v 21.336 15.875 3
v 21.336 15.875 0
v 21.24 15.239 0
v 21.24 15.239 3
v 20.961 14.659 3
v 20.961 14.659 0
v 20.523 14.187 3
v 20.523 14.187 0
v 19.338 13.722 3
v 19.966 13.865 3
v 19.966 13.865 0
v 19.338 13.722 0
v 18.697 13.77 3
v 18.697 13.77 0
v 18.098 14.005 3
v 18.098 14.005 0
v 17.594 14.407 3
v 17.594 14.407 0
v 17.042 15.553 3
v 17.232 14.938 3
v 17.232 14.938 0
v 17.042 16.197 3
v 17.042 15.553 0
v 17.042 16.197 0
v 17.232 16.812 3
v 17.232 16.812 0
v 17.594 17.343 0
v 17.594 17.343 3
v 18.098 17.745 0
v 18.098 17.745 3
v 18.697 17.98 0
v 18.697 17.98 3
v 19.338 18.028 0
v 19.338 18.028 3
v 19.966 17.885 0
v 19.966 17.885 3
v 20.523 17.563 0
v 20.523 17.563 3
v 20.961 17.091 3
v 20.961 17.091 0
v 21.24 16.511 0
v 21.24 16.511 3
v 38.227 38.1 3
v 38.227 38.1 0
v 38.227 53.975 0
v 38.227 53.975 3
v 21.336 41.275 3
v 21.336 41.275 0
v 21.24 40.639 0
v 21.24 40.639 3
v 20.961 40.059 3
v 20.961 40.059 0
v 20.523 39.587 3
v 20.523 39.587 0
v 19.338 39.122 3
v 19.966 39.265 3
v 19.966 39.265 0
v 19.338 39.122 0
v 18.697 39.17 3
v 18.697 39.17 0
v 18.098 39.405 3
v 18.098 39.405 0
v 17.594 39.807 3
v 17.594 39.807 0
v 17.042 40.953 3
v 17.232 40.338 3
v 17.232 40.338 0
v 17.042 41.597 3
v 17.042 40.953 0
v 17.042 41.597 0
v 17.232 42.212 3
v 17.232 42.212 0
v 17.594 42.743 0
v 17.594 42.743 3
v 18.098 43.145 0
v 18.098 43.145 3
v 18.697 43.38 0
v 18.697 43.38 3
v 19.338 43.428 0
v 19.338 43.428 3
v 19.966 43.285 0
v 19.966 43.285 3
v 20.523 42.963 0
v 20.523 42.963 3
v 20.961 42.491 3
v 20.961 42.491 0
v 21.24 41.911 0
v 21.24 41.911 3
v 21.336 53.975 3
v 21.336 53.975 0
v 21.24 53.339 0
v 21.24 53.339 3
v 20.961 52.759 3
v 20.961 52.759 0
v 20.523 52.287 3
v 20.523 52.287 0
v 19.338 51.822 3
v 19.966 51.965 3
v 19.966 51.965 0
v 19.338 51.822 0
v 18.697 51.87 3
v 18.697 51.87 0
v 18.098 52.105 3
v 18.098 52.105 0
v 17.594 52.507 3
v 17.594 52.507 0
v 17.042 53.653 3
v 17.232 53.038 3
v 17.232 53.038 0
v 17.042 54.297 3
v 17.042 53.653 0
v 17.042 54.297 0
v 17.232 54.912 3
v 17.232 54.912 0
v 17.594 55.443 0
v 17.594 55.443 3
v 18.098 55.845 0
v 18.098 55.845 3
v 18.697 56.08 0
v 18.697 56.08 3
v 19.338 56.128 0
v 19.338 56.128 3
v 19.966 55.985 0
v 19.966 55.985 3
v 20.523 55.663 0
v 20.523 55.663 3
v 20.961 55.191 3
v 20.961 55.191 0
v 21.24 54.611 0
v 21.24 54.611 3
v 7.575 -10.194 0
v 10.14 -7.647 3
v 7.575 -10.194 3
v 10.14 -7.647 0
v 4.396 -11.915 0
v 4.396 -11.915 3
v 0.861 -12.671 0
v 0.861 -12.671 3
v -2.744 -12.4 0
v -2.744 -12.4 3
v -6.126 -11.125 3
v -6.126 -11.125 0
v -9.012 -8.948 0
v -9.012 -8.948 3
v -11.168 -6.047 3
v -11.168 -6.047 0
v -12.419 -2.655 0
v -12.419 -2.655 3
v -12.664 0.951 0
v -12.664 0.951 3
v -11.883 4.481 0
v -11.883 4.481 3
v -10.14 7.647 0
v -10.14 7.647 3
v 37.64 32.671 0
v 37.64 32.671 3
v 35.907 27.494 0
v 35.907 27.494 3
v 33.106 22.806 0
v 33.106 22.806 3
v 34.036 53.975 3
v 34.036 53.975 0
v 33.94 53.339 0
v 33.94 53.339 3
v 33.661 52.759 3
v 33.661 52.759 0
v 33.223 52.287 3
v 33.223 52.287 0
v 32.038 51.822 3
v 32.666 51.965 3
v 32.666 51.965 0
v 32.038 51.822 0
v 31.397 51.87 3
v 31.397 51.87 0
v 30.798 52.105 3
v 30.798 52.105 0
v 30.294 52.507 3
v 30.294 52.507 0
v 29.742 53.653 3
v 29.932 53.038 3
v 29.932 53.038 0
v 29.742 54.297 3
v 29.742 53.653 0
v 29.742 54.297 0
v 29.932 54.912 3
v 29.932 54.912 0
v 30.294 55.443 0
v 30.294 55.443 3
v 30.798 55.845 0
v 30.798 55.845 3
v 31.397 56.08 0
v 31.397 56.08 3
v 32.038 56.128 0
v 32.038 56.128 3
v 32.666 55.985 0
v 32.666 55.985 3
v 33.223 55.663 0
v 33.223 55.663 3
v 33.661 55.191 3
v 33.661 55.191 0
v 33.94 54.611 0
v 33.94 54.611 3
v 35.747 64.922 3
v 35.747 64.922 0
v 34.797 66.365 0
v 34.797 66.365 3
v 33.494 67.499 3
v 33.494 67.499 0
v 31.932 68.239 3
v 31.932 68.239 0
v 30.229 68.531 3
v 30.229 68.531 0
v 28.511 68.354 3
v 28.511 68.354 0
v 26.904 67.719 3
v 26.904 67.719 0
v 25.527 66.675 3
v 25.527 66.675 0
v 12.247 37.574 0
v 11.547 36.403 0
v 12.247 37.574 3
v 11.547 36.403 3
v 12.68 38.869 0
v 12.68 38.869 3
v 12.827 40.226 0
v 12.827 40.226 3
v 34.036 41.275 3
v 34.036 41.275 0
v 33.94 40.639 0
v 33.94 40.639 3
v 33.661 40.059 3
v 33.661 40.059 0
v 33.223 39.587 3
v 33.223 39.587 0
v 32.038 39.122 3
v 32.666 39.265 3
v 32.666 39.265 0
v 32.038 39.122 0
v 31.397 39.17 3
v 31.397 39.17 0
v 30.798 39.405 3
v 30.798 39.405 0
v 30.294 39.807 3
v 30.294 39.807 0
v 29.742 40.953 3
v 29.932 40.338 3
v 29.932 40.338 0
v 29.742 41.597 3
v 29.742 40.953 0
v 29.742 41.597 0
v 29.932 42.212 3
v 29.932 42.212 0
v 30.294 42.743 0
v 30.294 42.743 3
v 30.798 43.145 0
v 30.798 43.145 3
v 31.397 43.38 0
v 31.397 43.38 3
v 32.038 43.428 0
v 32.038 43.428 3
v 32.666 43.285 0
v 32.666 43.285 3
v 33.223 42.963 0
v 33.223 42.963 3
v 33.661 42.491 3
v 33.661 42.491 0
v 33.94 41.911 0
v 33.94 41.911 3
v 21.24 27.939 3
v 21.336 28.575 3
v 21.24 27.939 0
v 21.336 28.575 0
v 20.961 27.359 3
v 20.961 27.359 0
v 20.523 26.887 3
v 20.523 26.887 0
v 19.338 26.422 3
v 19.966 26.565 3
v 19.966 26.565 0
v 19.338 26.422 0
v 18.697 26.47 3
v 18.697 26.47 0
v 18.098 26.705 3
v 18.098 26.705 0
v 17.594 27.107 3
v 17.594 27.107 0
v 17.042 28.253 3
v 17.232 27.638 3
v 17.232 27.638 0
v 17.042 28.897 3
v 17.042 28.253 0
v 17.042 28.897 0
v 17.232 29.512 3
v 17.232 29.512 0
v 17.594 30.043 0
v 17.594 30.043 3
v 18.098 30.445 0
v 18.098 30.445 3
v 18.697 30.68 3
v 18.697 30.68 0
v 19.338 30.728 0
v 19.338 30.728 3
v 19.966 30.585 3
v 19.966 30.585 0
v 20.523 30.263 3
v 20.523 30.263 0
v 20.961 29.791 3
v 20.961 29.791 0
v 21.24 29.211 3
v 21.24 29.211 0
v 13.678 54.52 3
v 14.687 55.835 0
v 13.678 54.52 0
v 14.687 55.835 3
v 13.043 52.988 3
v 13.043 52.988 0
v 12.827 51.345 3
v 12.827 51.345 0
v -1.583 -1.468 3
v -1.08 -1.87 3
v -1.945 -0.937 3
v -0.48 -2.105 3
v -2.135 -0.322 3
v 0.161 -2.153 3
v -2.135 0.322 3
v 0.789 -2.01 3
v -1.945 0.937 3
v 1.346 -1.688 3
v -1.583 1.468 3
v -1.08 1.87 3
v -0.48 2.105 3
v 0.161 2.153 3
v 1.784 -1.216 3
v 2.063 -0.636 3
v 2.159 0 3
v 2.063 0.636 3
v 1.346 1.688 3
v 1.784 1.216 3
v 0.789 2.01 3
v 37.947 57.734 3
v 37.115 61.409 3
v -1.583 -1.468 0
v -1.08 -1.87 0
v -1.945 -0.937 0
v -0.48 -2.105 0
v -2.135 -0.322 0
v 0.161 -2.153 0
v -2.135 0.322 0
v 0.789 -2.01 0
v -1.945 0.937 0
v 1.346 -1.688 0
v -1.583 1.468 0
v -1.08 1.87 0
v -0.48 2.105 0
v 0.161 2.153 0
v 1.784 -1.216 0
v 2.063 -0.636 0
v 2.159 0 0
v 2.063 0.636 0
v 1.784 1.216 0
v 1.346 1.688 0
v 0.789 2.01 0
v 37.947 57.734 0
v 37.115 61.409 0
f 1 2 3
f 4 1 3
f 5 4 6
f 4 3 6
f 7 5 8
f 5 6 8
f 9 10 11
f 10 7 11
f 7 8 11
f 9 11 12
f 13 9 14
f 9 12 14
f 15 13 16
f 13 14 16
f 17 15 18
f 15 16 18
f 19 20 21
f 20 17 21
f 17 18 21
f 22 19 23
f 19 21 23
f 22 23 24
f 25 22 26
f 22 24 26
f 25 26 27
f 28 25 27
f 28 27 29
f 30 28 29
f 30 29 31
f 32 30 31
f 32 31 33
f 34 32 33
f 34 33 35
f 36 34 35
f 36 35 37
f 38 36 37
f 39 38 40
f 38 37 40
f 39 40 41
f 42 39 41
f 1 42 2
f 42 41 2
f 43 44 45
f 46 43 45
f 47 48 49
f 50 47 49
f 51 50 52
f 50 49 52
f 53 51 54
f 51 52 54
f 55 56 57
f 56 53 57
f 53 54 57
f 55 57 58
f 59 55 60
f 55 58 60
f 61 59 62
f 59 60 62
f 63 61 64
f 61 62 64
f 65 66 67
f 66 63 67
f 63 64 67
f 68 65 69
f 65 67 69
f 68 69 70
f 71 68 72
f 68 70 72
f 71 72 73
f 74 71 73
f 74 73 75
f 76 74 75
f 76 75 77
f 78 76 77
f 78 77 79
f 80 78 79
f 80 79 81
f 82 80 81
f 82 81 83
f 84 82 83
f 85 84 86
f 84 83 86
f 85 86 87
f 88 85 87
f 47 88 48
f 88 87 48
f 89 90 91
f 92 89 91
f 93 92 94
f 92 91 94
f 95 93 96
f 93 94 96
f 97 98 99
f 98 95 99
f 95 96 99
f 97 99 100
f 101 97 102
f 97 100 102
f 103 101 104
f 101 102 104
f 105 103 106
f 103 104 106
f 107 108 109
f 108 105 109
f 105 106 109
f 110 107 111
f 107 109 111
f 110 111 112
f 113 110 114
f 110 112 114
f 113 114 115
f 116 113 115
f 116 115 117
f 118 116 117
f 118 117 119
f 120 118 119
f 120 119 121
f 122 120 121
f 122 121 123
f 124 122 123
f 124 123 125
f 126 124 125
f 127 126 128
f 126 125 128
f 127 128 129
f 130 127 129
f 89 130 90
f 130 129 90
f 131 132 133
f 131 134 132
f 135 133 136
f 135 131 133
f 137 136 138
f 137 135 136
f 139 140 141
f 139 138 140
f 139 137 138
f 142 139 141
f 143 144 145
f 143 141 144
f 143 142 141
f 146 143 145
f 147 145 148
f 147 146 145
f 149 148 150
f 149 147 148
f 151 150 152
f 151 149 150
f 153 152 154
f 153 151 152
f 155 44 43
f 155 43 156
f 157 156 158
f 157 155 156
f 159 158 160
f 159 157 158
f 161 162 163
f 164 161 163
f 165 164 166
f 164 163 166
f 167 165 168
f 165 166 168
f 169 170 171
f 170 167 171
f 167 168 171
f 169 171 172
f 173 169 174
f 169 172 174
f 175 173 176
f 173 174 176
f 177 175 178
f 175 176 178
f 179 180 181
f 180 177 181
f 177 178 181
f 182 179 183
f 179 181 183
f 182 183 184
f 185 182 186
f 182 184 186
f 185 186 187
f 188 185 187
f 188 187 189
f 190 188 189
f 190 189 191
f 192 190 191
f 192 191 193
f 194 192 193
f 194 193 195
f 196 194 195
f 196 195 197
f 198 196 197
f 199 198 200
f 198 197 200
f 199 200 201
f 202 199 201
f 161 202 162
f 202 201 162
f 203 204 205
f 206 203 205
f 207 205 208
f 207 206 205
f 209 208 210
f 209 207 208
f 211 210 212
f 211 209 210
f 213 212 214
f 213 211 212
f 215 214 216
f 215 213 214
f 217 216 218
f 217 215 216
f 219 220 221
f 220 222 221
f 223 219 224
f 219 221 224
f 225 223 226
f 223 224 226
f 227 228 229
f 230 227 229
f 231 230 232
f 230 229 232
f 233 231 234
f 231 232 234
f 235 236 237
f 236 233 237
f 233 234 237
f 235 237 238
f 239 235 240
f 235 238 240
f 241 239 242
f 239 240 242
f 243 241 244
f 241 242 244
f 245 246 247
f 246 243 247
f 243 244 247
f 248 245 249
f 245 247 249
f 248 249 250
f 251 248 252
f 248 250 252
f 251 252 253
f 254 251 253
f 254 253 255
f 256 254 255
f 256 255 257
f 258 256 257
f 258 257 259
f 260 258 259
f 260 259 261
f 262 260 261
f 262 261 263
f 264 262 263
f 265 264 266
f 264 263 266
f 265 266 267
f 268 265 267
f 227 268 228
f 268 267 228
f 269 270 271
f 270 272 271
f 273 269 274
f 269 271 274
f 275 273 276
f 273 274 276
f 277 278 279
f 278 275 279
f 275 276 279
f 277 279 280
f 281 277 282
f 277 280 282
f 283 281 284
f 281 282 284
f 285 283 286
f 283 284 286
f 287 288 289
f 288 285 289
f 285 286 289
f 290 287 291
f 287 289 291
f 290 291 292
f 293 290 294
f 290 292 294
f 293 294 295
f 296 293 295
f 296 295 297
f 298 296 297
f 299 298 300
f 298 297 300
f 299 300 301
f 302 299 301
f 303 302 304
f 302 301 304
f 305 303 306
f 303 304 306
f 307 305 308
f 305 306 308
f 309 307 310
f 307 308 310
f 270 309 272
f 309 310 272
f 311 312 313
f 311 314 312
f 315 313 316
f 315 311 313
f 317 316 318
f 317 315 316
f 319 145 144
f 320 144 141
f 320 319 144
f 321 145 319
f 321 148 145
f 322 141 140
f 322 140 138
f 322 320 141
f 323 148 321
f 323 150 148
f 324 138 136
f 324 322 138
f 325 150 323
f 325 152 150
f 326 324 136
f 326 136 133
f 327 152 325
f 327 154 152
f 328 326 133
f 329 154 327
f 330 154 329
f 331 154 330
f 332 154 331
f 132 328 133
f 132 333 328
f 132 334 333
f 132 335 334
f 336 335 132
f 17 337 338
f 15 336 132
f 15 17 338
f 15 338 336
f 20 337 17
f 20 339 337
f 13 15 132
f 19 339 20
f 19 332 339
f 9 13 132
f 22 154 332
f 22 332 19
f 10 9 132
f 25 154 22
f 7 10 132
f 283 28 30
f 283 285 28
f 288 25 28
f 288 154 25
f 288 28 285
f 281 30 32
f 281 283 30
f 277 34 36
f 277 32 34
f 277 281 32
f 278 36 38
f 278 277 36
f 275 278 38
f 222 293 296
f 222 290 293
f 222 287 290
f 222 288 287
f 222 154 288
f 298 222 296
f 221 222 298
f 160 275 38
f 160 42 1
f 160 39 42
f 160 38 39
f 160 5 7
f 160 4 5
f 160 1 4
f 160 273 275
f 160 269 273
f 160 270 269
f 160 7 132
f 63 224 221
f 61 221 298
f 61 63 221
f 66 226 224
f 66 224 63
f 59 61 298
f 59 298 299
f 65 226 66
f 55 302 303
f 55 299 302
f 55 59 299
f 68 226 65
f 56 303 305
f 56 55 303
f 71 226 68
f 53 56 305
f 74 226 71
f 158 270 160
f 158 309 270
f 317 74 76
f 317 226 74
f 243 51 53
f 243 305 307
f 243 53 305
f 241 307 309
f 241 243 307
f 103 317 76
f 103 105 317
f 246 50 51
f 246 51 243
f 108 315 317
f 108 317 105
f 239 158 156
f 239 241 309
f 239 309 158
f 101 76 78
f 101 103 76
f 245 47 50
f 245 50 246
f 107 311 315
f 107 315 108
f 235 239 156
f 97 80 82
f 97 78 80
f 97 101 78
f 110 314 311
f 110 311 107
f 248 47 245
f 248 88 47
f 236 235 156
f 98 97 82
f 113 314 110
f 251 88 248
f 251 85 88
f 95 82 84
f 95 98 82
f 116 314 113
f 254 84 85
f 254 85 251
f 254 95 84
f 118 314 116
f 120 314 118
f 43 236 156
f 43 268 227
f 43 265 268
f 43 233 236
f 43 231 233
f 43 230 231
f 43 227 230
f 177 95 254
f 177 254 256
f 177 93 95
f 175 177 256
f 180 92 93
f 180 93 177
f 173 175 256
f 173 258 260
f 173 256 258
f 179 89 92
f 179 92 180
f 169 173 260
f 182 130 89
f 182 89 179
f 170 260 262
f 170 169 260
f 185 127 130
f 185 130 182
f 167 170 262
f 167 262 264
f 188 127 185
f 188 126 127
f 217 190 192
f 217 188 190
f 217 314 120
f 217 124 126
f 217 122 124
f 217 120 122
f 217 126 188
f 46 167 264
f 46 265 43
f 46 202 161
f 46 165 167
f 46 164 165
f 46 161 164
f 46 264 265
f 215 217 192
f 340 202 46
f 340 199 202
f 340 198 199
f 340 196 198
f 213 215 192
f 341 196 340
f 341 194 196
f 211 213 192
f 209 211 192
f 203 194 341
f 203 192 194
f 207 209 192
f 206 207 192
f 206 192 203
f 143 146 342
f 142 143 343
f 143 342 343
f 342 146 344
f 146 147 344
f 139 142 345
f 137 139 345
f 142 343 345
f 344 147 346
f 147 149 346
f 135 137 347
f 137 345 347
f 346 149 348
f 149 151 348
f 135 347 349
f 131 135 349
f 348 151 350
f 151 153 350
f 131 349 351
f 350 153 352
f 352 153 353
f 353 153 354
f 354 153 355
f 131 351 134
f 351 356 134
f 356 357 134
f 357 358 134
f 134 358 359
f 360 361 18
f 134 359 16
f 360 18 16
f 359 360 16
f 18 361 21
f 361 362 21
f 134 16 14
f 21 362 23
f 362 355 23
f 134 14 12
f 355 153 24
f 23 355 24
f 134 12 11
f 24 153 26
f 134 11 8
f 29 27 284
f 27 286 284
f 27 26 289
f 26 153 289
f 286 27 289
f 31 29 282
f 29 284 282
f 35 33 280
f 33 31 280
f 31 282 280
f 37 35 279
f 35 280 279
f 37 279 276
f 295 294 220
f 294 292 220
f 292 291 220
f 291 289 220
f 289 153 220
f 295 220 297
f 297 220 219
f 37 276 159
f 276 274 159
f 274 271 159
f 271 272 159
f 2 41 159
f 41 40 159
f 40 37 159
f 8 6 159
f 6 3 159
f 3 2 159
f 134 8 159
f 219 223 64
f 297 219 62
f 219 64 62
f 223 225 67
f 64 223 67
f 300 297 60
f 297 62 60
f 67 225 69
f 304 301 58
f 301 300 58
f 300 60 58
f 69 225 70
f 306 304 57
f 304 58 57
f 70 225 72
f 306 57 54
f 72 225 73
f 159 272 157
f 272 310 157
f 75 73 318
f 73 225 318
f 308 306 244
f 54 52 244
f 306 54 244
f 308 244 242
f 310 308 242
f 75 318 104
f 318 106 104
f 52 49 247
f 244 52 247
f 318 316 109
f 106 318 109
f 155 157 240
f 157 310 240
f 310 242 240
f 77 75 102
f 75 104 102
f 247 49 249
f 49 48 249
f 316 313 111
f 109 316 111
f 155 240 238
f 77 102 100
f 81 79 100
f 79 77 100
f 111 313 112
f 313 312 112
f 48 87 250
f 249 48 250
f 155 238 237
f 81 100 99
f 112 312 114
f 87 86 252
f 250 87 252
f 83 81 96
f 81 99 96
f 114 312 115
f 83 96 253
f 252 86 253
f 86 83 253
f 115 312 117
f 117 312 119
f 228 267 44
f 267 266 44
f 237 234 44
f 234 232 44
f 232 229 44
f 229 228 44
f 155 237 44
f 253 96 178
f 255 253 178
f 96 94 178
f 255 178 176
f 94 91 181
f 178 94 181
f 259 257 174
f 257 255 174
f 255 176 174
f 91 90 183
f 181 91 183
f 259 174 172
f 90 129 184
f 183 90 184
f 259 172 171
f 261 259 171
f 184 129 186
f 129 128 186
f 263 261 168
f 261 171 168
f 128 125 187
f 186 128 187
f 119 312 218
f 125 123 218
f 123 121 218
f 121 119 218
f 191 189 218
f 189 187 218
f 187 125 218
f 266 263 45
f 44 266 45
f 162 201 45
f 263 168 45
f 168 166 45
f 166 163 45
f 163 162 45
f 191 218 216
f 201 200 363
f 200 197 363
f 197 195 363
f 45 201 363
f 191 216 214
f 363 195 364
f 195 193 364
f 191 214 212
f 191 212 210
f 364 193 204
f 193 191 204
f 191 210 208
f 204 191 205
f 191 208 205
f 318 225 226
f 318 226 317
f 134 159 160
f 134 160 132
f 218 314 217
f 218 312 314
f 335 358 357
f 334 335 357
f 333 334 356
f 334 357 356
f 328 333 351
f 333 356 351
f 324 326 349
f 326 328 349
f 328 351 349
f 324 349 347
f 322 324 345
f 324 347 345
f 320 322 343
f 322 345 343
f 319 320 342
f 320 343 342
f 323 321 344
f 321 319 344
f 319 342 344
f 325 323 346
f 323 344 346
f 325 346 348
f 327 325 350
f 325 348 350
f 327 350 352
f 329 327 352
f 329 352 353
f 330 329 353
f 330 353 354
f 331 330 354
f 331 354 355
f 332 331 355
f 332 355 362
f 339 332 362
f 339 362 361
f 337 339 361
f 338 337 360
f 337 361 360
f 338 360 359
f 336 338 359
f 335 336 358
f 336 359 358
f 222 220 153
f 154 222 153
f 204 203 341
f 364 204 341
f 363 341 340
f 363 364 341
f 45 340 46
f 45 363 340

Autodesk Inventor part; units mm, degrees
ref_plane "YZ Plane" through (0, 0, 0) normal (1, 0, 0) x (0, 1, 0)
ref_plane "XZ Plane" through (0, 0, 0) normal (0, 1, 0) x (-1, 0, 0)
ref_plane "XY Plane" through (0, 0, 0) normal (0, 0, 1) x (1, 0, 0)
sketch "Sketch1" plane through (0, 0, 0) normal (0, 0, 1) x (1, 0, 0)
  circle A0 centre (0, 0) radius 2.159
  circle A1 centre (0, 0) radius 12.7
  line L0 (0, 0) -> (0, 38.1) construction
  line L1 (0, 38.1) -> (12.827, 38.1) construction
  line L2 (12.827, 38.1) -> (12.827, 53.975)
  line L3 (12.827, 53.975) -> (30.7875, 71.9355)
  line L4 (12.827, 53.975) -> (38.227, 53.975) construction
  arc A2 (38.227, 53.975) -> (30.7875, 71.9355) centre (12.827, 53.975) ccw
  line L5 (12.827, 38.1) -> (-10.1397, 7.647)
  arc A3 (33.1064, 22.806) -> (38.227, 38.1) centre (12.827, 38.1) ccw
  line L6 (33.1064, 22.806) -> (10.1397, -7.647)
  line L7 (38.227, 38.1) -> (38.227, 53.975)
  circle A4 centre (31.877, 53.975) radius 2.159
  circle A5 centre (19.177, 53.975) radius 2.159
  circle A6 centre (31.877, 41.275) radius 2.159
  circle A7 centre (19.177, 41.275) radius 2.159
  circle A8 centre (31.877, 53.975) radius 6.35 construction
  circle A9 centre (19.177, 53.975) radius 6.35 construction
  circle A10 centre (19.177, 28.575) radius 2.159
  circle A11 centre (19.177, 15.875) radius 2.159
  dimension "d0" = 4.318
  dimension "d1" = 25.4
  dimension "d2" = 38.1
  dimension "d3" = 12.827
  dimension "d4" = 15.875
  dimension "d5" = 25.4
  dimension "d6" = 45
  dimension "d7" = 4.318
  dimension "d10" = 12.7
  dimension "d13" = 12.7
  dimension "d17" = 12.7
  dimension "d18" = 12.7
extrude "Extrusion1" add sketch "Sketch1" along normal blind 3
fillet "Fillet1" radius 6.35 3 edges at (30.7875, 71.9355, 1.5) (12.827, 53.975, 1.5) (12.827, 38.1, 1.5)
properties part number "IntakeAftArm"
